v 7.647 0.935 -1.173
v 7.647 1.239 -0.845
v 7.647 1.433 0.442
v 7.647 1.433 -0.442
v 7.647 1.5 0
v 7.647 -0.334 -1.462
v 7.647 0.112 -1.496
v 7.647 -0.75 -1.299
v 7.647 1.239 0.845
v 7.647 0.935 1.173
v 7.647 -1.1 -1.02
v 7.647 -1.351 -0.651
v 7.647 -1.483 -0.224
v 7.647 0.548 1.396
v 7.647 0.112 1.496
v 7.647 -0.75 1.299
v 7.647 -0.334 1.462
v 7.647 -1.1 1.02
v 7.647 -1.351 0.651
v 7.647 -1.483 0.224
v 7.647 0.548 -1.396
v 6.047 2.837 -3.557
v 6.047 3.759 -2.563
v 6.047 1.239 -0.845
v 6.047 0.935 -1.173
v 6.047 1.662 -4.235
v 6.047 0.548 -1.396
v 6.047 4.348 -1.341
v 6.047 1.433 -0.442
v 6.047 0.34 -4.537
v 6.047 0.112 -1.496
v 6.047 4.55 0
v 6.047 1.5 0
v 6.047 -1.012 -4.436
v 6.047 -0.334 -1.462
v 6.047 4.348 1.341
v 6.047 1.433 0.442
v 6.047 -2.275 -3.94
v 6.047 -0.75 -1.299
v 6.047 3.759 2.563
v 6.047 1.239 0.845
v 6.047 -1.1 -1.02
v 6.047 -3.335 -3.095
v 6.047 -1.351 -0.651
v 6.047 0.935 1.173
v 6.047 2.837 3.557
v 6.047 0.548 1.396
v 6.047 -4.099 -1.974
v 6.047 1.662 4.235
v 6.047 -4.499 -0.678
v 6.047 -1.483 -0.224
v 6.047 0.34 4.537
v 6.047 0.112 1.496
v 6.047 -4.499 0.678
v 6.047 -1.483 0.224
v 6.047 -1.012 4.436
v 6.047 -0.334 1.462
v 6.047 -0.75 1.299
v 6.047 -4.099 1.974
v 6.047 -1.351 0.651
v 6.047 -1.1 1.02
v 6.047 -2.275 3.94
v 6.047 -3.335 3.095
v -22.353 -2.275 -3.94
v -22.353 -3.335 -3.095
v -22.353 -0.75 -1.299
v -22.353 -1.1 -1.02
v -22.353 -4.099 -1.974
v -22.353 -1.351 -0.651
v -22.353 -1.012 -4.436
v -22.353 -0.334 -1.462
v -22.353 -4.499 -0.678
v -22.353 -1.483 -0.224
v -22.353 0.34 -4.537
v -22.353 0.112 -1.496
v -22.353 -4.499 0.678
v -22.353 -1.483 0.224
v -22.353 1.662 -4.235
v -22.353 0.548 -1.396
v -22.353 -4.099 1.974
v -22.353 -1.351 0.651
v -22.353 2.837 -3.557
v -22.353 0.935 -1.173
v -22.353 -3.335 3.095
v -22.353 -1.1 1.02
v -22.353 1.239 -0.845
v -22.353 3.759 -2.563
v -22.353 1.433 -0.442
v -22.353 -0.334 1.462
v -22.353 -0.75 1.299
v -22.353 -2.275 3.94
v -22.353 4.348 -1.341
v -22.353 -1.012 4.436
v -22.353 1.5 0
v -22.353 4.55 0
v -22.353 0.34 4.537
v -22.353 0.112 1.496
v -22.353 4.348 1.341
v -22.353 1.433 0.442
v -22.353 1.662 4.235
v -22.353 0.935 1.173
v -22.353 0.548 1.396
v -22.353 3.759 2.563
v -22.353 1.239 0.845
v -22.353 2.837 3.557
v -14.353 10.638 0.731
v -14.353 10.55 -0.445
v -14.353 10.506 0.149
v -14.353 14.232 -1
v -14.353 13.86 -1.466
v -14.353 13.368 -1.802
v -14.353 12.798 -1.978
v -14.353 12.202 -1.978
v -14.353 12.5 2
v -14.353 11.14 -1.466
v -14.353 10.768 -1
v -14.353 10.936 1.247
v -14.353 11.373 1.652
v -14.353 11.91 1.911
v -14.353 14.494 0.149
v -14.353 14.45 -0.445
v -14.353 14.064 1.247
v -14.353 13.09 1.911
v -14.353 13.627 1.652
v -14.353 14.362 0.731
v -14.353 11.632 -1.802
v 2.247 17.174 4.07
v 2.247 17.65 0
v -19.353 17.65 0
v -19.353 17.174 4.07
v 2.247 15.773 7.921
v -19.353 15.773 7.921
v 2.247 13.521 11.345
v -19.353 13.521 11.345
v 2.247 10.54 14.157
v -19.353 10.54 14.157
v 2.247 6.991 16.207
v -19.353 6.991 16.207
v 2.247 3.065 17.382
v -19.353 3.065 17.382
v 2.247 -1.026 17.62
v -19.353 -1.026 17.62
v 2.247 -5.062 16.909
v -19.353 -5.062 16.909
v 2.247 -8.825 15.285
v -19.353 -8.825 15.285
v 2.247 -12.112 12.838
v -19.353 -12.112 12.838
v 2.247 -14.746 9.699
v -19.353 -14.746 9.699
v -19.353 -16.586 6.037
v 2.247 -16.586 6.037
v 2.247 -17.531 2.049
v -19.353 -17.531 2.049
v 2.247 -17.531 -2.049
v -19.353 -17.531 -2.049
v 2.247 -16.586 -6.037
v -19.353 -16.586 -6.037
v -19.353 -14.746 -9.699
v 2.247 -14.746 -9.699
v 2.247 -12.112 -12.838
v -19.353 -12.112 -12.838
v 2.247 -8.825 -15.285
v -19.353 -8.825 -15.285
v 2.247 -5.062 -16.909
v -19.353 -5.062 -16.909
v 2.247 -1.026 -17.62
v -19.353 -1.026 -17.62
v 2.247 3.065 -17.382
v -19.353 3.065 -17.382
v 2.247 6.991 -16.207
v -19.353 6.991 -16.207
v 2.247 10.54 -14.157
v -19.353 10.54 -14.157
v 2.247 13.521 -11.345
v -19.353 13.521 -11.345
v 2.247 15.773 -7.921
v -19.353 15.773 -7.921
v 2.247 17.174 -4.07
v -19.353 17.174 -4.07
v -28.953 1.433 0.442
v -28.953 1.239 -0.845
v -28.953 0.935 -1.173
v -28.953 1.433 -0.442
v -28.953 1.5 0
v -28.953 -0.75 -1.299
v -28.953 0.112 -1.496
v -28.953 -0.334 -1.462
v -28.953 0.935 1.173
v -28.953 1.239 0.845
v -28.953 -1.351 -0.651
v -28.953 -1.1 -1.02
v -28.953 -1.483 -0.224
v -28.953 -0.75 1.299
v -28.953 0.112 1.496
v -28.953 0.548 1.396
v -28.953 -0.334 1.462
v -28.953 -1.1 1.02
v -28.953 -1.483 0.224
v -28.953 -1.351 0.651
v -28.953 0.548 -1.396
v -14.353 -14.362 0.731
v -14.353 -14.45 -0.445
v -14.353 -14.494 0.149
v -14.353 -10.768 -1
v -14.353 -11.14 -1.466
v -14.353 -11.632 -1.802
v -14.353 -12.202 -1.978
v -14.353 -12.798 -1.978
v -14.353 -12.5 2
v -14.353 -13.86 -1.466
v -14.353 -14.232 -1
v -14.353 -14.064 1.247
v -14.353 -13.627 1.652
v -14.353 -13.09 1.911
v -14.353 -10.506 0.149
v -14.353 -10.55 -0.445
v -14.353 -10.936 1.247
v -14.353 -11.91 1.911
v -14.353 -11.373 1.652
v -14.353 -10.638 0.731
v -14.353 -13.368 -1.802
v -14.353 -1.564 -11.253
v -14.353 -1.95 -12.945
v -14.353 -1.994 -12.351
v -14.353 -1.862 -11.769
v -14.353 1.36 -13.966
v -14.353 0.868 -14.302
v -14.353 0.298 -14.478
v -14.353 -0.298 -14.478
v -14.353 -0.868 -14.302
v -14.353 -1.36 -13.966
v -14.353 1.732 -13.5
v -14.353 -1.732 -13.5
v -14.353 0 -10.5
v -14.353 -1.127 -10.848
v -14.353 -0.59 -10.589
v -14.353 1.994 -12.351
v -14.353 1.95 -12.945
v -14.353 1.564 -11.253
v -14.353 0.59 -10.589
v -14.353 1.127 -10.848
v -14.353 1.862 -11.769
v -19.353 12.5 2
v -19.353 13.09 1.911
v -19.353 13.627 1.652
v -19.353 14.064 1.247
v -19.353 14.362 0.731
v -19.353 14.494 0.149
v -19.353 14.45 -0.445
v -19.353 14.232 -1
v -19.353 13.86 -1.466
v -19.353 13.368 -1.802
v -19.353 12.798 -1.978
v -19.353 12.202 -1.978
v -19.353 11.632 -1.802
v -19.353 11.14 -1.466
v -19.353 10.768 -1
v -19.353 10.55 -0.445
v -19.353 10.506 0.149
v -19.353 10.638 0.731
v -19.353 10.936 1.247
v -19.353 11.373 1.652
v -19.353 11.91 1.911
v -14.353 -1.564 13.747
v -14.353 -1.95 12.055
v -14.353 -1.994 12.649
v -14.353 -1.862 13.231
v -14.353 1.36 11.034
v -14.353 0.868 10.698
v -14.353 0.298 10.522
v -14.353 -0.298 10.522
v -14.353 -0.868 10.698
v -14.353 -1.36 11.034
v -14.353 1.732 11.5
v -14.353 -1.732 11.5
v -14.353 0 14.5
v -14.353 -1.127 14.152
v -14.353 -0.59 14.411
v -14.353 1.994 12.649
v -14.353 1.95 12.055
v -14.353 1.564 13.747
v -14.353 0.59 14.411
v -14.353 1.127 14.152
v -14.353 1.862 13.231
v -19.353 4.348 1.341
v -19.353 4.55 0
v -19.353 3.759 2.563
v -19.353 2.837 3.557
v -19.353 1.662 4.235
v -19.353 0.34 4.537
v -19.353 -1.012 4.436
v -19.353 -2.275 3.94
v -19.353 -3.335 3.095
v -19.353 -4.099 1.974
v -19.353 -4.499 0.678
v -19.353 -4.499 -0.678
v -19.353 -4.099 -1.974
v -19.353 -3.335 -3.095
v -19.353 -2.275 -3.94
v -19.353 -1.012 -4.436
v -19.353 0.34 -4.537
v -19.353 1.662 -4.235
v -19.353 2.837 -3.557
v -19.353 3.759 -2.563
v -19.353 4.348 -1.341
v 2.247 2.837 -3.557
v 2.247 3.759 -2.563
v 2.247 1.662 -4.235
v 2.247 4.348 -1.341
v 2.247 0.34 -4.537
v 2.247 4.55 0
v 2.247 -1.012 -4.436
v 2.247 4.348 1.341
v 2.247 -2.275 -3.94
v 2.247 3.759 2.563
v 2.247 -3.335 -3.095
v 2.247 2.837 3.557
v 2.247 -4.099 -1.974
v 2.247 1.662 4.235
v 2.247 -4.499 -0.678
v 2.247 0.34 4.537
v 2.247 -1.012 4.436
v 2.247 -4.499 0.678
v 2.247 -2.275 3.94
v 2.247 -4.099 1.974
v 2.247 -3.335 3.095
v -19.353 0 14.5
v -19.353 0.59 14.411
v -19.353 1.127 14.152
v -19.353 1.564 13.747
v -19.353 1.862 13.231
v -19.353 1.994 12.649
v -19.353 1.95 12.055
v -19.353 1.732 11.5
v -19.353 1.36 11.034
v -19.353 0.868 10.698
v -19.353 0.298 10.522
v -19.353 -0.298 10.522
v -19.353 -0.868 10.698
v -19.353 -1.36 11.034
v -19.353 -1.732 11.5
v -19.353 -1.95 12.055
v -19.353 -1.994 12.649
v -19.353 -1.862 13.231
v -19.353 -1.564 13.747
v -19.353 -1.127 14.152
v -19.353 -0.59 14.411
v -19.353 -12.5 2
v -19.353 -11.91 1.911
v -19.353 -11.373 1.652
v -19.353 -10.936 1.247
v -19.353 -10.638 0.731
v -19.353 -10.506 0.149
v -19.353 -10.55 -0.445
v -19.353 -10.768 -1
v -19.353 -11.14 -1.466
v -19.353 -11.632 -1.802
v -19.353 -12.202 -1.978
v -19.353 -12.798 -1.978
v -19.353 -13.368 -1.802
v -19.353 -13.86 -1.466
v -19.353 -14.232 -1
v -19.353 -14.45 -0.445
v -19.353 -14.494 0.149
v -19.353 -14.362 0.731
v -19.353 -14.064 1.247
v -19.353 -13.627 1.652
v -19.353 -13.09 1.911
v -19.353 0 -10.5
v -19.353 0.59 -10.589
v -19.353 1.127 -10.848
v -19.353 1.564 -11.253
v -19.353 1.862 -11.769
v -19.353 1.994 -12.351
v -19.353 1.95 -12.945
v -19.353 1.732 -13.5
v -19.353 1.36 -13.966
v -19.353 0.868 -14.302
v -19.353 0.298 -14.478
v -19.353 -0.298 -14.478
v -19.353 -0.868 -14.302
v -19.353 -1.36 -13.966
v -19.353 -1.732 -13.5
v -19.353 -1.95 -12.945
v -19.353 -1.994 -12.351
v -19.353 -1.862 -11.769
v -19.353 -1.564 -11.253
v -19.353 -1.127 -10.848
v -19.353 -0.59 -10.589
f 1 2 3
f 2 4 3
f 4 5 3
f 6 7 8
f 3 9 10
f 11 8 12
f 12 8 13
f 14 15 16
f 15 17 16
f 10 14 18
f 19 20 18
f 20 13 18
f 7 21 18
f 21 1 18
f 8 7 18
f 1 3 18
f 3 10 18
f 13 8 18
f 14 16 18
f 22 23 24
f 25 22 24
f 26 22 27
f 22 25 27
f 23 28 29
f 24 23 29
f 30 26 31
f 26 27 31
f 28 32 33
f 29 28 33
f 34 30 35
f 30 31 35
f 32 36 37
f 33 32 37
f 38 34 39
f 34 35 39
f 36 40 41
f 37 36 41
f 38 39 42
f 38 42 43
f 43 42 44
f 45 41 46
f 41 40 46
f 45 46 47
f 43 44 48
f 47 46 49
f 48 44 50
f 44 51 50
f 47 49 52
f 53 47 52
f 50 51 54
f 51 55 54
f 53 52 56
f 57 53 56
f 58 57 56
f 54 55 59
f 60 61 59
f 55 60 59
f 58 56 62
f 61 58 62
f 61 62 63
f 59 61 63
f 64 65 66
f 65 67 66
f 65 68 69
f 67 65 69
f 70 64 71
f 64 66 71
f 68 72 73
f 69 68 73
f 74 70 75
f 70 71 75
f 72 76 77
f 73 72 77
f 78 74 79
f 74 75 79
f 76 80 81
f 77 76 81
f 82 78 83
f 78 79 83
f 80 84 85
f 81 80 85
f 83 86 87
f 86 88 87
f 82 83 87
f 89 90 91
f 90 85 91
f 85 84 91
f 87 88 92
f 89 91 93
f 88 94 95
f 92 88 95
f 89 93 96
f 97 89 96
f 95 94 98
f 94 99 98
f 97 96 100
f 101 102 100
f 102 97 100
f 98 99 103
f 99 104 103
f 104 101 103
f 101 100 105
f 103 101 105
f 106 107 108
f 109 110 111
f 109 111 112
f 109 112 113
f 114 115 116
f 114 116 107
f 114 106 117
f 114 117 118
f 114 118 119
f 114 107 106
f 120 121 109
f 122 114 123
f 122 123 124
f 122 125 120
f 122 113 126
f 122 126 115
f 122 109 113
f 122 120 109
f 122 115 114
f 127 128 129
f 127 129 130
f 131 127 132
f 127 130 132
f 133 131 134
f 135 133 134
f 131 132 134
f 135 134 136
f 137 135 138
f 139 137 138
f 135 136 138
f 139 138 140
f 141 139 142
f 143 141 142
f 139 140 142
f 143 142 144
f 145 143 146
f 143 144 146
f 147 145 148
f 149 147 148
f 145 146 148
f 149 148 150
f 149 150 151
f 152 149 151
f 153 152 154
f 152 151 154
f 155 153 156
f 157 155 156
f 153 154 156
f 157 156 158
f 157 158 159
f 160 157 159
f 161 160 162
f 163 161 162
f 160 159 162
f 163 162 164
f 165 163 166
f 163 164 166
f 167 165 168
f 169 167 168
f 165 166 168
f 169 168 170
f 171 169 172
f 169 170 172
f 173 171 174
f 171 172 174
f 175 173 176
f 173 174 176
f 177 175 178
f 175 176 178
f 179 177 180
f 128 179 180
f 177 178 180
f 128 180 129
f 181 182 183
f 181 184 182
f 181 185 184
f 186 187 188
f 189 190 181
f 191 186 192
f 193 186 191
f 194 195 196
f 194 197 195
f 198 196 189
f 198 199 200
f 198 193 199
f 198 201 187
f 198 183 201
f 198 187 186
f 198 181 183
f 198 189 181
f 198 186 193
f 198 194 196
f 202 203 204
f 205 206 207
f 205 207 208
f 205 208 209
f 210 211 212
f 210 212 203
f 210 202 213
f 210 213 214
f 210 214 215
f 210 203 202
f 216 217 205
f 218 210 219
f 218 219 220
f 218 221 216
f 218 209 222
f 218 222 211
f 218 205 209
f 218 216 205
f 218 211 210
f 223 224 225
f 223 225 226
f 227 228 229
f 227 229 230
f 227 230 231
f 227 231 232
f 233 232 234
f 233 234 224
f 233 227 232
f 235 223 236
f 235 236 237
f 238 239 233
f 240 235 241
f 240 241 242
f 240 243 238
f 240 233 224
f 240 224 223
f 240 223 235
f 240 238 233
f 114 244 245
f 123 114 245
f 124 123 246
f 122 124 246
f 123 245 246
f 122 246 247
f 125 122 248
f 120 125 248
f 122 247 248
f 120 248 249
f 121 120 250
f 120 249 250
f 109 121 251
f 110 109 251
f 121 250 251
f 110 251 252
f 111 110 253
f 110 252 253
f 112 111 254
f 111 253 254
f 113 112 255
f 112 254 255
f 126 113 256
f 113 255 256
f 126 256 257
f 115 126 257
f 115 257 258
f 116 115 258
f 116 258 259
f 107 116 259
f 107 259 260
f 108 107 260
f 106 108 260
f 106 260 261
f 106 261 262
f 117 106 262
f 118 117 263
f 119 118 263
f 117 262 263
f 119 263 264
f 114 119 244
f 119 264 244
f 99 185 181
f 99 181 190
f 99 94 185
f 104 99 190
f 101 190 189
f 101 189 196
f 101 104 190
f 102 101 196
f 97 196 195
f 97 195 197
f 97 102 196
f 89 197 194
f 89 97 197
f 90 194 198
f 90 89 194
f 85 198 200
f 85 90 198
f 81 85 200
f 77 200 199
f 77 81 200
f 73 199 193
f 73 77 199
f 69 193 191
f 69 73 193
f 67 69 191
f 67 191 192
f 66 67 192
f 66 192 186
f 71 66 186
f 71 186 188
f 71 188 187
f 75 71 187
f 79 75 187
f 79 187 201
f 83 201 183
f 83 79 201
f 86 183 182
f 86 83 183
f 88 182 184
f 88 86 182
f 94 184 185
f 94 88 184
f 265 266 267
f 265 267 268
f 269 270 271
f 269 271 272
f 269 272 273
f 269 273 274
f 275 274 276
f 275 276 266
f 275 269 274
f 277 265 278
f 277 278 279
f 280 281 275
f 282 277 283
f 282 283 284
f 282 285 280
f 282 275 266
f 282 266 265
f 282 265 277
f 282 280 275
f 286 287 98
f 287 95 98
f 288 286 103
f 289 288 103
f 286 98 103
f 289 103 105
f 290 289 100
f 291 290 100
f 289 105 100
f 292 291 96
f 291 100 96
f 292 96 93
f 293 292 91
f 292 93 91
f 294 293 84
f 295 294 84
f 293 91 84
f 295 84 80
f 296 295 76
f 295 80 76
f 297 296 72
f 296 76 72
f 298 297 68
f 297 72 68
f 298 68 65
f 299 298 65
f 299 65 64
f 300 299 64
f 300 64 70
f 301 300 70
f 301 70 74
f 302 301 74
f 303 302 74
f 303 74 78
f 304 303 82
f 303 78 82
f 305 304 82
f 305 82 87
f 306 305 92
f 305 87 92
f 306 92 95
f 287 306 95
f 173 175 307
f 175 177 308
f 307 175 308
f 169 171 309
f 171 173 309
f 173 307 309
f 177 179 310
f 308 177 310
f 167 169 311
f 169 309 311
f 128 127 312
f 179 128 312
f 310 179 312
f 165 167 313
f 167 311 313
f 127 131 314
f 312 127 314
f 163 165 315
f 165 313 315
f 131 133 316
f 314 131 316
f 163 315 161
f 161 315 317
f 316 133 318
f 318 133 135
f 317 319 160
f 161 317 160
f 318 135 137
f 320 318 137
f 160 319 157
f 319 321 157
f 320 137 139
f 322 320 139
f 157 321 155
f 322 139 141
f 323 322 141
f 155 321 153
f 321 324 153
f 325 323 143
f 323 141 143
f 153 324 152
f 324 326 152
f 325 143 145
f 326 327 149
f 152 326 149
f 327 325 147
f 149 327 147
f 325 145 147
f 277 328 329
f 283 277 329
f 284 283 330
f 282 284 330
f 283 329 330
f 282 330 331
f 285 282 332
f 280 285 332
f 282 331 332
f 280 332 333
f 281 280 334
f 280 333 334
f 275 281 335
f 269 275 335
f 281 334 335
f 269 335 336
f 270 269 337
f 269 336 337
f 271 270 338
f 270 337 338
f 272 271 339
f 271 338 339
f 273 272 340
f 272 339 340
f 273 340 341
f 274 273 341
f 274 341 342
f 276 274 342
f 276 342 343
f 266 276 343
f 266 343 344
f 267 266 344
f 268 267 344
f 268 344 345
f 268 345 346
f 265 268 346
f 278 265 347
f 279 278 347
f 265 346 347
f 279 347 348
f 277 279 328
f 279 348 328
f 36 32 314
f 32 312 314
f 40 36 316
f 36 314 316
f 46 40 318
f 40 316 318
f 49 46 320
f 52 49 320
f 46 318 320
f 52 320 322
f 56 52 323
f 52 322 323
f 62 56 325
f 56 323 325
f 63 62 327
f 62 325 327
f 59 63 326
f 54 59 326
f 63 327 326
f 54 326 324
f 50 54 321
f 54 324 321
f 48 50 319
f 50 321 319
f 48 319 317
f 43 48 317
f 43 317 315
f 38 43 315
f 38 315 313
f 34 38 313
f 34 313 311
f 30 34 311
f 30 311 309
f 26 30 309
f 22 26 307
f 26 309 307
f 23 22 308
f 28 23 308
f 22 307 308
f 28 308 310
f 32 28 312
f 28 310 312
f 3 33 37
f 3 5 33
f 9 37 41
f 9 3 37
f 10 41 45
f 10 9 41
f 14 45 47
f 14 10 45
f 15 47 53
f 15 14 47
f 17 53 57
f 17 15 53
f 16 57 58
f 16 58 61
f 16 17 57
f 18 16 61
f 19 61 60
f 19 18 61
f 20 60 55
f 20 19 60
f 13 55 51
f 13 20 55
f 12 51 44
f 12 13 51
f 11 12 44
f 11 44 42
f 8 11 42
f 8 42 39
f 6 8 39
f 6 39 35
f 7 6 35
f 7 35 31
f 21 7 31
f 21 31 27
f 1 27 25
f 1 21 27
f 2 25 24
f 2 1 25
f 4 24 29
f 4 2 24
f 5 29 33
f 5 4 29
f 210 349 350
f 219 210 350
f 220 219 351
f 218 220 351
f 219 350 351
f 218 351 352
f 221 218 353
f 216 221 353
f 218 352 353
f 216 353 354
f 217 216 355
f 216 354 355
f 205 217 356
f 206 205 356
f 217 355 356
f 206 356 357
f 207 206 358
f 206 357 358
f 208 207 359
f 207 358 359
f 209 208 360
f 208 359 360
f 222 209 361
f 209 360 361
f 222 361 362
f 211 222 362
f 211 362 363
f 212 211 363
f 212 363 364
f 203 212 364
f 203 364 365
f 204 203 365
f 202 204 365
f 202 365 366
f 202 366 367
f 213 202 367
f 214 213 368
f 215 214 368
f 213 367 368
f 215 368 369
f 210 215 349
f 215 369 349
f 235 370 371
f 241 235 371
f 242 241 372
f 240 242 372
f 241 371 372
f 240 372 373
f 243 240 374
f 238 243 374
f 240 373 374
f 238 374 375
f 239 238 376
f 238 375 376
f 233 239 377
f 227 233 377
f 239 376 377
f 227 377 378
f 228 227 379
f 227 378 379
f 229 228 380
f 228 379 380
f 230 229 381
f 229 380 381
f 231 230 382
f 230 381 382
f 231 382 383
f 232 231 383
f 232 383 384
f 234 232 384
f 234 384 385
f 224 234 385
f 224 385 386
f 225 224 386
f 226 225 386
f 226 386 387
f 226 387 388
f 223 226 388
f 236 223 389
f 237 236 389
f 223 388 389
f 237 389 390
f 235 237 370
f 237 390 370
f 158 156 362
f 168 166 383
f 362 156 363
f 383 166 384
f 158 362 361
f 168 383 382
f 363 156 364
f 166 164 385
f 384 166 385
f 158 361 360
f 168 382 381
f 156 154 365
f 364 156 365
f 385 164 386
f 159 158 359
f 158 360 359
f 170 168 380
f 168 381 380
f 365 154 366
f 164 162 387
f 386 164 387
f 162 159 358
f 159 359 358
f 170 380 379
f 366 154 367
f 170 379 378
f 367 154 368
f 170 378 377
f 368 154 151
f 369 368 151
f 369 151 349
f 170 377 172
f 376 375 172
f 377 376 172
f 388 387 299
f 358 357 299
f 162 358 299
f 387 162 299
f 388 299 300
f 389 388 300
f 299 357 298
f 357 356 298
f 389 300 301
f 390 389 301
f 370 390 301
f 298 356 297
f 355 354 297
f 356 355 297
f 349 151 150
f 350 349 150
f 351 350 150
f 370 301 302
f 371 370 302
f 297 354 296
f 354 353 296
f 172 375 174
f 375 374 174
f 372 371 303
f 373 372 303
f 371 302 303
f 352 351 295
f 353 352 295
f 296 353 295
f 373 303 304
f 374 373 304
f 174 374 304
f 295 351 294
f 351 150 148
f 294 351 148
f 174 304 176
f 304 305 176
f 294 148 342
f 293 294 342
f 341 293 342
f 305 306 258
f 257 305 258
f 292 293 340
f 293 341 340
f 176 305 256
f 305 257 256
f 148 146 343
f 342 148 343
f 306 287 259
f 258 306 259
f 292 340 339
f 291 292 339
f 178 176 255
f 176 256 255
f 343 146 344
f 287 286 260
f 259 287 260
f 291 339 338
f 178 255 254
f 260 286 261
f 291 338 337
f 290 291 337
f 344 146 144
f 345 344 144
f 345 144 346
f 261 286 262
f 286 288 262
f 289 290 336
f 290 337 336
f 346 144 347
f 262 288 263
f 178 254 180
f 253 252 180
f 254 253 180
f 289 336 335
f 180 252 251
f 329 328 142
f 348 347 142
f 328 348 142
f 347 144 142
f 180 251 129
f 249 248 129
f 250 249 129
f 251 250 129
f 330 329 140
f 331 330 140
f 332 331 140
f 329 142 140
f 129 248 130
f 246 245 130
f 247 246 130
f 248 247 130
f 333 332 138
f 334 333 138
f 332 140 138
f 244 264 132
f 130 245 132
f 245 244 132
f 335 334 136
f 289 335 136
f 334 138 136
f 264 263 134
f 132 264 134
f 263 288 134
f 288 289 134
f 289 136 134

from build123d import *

# Parameters (mm, degrees)
SKETCH_1_W          = 6.6
SKETCH_1_H          = 1.5
SKETCH_1_W_2        = 1.6
SKETCH_2_R          = 2
CUT_EXTRUDE_1_DEPTH = 5


with BuildPart() as part:
    # 草图1 → 旋转2 (revolve)
    with BuildSketch(Plane.XY):
        with Locations((-25.652830189, 0.75)):
            Rectangle(SKETCH_1_W, SKETCH_1_H)
        Polygon((-22.352830189, 1.5), (-22.352830189, 0), (-19.352830189, 0), (-19.352830189, 4.55), (-22.352830189, 4.55), align=None)
        Polygon((-19.352830189, 4.55), (-19.352830189, 0), (2.247169811, 0), (2.247169811, 4.55), (2.247169811, 17.65), (-19.352830189, 17.65), align=None)
        Polygon((2.247169811, 4.55), (2.247169811, 0), (6.047169811, 0), (6.047169811, 1.5), (6.047169811, 4.55), align=None)
        with Locations((6.847169811, 0.75)):
            Rectangle(SKETCH_1_W_2, SKETCH_1_H)
    revolve(axis=Axis((-28.952830189, 0, 0), (1, 0, 0)))

    # 草图2 → 切除-拉伸1 (cut)
    with BuildSketch(Plane.ZY.offset(19.352830189)):
        with Locations((0, 12.5)):
            Circle(SKETCH_2_R)
        with Locations((0, -12.5)):
            Circle(SKETCH_2_R)
        with Locations((-12.5, 0)):
            Circle(SKETCH_2_R)
        with Locations((12.5, 0)):
            Circle(SKETCH_2_R)
    extrude(amount=-CUT_EXTRUDE_1_DEPTH, mode=Mode.SUBTRACT)


solid = part.part
